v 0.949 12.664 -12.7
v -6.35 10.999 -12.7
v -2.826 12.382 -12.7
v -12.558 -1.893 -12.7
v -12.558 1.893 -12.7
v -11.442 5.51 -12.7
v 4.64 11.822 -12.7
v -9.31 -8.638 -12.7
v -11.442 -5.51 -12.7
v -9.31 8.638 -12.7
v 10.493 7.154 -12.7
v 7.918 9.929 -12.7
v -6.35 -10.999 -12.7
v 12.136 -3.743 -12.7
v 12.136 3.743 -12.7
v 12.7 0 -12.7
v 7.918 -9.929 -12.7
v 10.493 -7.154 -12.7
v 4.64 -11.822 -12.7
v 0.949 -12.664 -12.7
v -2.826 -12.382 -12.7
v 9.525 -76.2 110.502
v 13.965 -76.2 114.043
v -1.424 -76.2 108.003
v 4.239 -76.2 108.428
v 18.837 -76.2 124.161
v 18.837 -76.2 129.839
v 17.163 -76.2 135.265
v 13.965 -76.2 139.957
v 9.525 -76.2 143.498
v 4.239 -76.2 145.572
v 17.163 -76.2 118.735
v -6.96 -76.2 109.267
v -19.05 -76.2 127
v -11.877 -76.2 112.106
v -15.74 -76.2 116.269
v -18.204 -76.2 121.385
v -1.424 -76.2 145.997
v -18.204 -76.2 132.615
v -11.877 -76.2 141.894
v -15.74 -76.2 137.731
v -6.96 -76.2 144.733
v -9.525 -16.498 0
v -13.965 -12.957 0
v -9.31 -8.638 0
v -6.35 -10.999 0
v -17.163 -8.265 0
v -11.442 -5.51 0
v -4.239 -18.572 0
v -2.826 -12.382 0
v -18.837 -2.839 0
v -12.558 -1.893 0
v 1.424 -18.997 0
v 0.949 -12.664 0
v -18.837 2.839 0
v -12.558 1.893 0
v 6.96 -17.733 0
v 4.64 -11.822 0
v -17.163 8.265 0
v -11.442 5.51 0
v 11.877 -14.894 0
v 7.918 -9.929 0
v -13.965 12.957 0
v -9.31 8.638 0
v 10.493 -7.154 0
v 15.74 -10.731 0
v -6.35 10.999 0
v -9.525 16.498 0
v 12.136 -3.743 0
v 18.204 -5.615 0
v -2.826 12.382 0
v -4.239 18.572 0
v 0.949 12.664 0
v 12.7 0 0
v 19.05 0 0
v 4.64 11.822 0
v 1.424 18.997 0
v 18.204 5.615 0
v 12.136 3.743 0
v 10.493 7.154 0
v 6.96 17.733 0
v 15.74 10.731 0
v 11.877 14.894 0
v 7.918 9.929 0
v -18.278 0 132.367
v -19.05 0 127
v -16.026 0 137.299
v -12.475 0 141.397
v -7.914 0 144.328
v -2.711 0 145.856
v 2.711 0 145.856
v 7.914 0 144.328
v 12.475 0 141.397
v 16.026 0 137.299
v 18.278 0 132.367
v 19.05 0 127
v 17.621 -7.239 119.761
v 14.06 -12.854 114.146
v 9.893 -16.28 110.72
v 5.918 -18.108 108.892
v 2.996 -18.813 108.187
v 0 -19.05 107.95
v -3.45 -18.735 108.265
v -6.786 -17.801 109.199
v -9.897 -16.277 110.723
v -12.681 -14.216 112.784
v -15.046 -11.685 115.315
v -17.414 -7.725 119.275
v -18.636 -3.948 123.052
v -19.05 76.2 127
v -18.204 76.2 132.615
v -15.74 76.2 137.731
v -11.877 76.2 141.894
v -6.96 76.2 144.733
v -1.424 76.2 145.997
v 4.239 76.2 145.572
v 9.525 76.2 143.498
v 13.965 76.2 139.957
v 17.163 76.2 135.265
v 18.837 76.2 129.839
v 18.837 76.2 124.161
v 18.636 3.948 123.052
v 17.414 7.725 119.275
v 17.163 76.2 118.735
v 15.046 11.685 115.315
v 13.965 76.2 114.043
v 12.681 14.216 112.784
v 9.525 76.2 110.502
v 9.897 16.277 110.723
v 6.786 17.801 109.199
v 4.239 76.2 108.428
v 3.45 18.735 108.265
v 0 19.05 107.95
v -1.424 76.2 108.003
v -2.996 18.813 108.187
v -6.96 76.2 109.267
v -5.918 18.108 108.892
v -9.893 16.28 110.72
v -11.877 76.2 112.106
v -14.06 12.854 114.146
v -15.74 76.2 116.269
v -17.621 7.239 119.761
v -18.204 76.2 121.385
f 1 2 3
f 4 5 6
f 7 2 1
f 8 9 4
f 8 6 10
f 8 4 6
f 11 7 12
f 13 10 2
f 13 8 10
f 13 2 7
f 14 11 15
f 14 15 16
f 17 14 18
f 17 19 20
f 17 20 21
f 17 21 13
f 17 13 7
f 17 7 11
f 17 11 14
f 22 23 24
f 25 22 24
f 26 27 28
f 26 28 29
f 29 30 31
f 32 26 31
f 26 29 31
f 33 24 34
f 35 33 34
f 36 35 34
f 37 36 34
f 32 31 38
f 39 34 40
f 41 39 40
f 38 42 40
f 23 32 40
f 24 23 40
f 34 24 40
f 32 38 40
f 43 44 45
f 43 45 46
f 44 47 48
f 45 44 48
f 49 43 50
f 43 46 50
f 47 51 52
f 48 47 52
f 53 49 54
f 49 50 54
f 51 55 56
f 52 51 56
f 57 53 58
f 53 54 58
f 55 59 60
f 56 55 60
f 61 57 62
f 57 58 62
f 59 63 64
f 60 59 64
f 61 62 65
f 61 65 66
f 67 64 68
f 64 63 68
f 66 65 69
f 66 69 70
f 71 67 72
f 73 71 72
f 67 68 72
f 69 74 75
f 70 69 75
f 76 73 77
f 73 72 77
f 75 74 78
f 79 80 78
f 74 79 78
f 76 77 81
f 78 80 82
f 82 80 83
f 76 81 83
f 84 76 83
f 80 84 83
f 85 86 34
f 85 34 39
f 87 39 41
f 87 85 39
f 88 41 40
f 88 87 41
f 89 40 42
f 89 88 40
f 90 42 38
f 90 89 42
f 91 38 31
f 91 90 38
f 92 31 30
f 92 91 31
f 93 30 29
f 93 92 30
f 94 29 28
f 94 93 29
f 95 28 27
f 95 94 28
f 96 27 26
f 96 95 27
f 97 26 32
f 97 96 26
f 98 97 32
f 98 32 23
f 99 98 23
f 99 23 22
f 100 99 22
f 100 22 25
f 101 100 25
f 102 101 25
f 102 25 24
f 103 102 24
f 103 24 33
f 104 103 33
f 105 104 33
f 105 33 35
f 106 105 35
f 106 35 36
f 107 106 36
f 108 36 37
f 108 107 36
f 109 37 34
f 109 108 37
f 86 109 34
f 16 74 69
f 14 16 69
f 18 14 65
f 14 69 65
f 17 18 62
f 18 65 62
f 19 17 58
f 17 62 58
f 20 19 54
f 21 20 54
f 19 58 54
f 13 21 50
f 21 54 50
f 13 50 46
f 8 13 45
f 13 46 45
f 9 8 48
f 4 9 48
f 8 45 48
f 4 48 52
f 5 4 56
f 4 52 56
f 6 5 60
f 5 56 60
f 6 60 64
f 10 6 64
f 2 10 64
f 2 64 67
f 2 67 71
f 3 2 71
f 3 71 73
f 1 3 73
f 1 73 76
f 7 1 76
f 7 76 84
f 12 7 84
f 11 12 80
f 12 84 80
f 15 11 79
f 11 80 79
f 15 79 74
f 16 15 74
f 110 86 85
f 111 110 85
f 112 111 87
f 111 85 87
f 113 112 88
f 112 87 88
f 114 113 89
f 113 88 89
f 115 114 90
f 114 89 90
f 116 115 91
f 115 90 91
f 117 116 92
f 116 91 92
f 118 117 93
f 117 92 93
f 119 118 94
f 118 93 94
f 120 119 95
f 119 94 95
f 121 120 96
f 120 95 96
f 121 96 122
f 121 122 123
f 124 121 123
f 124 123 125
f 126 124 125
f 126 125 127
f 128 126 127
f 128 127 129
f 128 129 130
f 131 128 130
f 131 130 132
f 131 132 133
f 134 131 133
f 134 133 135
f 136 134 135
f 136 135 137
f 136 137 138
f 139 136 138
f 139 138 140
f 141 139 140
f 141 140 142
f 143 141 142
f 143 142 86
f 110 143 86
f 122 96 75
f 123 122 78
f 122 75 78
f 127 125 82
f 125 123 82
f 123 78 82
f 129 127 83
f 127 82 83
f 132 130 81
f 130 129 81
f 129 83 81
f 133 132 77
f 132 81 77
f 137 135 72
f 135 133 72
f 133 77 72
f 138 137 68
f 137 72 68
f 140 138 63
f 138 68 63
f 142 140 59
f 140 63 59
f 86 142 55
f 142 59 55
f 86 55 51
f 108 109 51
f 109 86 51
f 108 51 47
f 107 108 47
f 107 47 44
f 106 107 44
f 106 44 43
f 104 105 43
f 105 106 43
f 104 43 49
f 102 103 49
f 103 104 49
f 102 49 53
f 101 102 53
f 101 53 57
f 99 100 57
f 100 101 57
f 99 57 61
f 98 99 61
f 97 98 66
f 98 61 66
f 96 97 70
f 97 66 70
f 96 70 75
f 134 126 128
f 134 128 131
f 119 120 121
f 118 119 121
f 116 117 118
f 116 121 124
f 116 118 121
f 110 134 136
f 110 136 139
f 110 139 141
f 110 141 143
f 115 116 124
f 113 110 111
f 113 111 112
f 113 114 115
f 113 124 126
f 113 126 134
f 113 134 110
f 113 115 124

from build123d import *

# Parameters (mm, degrees)
F0_R          = 19.05
F1_DEPTH      = 127
F2_R          = 12.7
F3_DEPTH      = 12.7
F6_R          = 19.05
F7_DEPTH      = 76.2
F7_DEPTH_BACK = 76.2


with BuildPart() as f1:
    # F0 (on Top) → F1 (new body)
    with BuildSketch(Plane.XY):
        Circle(F0_R)
    extrude(amount=F1_DEPTH)

    # F2 (on face) → F3 (join)
    with BuildSketch(Plane(origin=(0, 0, 0), x_dir=(1, 0, 0), z_dir=(0, 0, -1))):
        Circle(F2_R)
    extrude(amount=F3_DEPTH)

    # F6 (on face) → F7 (join, two sides)
    with BuildSketch(Plane(origin=(0, 0, 0), x_dir=(-1, 0, 0), z_dir=(0, 1, 0))) as f7_sk:
        with Locations((0, 127)):
            Circle(F6_R)
    extrude(amount=F7_DEPTH)
    extrude(f7_sk.sketch, amount=-F7_DEPTH_BACK)


solid = f1.part
